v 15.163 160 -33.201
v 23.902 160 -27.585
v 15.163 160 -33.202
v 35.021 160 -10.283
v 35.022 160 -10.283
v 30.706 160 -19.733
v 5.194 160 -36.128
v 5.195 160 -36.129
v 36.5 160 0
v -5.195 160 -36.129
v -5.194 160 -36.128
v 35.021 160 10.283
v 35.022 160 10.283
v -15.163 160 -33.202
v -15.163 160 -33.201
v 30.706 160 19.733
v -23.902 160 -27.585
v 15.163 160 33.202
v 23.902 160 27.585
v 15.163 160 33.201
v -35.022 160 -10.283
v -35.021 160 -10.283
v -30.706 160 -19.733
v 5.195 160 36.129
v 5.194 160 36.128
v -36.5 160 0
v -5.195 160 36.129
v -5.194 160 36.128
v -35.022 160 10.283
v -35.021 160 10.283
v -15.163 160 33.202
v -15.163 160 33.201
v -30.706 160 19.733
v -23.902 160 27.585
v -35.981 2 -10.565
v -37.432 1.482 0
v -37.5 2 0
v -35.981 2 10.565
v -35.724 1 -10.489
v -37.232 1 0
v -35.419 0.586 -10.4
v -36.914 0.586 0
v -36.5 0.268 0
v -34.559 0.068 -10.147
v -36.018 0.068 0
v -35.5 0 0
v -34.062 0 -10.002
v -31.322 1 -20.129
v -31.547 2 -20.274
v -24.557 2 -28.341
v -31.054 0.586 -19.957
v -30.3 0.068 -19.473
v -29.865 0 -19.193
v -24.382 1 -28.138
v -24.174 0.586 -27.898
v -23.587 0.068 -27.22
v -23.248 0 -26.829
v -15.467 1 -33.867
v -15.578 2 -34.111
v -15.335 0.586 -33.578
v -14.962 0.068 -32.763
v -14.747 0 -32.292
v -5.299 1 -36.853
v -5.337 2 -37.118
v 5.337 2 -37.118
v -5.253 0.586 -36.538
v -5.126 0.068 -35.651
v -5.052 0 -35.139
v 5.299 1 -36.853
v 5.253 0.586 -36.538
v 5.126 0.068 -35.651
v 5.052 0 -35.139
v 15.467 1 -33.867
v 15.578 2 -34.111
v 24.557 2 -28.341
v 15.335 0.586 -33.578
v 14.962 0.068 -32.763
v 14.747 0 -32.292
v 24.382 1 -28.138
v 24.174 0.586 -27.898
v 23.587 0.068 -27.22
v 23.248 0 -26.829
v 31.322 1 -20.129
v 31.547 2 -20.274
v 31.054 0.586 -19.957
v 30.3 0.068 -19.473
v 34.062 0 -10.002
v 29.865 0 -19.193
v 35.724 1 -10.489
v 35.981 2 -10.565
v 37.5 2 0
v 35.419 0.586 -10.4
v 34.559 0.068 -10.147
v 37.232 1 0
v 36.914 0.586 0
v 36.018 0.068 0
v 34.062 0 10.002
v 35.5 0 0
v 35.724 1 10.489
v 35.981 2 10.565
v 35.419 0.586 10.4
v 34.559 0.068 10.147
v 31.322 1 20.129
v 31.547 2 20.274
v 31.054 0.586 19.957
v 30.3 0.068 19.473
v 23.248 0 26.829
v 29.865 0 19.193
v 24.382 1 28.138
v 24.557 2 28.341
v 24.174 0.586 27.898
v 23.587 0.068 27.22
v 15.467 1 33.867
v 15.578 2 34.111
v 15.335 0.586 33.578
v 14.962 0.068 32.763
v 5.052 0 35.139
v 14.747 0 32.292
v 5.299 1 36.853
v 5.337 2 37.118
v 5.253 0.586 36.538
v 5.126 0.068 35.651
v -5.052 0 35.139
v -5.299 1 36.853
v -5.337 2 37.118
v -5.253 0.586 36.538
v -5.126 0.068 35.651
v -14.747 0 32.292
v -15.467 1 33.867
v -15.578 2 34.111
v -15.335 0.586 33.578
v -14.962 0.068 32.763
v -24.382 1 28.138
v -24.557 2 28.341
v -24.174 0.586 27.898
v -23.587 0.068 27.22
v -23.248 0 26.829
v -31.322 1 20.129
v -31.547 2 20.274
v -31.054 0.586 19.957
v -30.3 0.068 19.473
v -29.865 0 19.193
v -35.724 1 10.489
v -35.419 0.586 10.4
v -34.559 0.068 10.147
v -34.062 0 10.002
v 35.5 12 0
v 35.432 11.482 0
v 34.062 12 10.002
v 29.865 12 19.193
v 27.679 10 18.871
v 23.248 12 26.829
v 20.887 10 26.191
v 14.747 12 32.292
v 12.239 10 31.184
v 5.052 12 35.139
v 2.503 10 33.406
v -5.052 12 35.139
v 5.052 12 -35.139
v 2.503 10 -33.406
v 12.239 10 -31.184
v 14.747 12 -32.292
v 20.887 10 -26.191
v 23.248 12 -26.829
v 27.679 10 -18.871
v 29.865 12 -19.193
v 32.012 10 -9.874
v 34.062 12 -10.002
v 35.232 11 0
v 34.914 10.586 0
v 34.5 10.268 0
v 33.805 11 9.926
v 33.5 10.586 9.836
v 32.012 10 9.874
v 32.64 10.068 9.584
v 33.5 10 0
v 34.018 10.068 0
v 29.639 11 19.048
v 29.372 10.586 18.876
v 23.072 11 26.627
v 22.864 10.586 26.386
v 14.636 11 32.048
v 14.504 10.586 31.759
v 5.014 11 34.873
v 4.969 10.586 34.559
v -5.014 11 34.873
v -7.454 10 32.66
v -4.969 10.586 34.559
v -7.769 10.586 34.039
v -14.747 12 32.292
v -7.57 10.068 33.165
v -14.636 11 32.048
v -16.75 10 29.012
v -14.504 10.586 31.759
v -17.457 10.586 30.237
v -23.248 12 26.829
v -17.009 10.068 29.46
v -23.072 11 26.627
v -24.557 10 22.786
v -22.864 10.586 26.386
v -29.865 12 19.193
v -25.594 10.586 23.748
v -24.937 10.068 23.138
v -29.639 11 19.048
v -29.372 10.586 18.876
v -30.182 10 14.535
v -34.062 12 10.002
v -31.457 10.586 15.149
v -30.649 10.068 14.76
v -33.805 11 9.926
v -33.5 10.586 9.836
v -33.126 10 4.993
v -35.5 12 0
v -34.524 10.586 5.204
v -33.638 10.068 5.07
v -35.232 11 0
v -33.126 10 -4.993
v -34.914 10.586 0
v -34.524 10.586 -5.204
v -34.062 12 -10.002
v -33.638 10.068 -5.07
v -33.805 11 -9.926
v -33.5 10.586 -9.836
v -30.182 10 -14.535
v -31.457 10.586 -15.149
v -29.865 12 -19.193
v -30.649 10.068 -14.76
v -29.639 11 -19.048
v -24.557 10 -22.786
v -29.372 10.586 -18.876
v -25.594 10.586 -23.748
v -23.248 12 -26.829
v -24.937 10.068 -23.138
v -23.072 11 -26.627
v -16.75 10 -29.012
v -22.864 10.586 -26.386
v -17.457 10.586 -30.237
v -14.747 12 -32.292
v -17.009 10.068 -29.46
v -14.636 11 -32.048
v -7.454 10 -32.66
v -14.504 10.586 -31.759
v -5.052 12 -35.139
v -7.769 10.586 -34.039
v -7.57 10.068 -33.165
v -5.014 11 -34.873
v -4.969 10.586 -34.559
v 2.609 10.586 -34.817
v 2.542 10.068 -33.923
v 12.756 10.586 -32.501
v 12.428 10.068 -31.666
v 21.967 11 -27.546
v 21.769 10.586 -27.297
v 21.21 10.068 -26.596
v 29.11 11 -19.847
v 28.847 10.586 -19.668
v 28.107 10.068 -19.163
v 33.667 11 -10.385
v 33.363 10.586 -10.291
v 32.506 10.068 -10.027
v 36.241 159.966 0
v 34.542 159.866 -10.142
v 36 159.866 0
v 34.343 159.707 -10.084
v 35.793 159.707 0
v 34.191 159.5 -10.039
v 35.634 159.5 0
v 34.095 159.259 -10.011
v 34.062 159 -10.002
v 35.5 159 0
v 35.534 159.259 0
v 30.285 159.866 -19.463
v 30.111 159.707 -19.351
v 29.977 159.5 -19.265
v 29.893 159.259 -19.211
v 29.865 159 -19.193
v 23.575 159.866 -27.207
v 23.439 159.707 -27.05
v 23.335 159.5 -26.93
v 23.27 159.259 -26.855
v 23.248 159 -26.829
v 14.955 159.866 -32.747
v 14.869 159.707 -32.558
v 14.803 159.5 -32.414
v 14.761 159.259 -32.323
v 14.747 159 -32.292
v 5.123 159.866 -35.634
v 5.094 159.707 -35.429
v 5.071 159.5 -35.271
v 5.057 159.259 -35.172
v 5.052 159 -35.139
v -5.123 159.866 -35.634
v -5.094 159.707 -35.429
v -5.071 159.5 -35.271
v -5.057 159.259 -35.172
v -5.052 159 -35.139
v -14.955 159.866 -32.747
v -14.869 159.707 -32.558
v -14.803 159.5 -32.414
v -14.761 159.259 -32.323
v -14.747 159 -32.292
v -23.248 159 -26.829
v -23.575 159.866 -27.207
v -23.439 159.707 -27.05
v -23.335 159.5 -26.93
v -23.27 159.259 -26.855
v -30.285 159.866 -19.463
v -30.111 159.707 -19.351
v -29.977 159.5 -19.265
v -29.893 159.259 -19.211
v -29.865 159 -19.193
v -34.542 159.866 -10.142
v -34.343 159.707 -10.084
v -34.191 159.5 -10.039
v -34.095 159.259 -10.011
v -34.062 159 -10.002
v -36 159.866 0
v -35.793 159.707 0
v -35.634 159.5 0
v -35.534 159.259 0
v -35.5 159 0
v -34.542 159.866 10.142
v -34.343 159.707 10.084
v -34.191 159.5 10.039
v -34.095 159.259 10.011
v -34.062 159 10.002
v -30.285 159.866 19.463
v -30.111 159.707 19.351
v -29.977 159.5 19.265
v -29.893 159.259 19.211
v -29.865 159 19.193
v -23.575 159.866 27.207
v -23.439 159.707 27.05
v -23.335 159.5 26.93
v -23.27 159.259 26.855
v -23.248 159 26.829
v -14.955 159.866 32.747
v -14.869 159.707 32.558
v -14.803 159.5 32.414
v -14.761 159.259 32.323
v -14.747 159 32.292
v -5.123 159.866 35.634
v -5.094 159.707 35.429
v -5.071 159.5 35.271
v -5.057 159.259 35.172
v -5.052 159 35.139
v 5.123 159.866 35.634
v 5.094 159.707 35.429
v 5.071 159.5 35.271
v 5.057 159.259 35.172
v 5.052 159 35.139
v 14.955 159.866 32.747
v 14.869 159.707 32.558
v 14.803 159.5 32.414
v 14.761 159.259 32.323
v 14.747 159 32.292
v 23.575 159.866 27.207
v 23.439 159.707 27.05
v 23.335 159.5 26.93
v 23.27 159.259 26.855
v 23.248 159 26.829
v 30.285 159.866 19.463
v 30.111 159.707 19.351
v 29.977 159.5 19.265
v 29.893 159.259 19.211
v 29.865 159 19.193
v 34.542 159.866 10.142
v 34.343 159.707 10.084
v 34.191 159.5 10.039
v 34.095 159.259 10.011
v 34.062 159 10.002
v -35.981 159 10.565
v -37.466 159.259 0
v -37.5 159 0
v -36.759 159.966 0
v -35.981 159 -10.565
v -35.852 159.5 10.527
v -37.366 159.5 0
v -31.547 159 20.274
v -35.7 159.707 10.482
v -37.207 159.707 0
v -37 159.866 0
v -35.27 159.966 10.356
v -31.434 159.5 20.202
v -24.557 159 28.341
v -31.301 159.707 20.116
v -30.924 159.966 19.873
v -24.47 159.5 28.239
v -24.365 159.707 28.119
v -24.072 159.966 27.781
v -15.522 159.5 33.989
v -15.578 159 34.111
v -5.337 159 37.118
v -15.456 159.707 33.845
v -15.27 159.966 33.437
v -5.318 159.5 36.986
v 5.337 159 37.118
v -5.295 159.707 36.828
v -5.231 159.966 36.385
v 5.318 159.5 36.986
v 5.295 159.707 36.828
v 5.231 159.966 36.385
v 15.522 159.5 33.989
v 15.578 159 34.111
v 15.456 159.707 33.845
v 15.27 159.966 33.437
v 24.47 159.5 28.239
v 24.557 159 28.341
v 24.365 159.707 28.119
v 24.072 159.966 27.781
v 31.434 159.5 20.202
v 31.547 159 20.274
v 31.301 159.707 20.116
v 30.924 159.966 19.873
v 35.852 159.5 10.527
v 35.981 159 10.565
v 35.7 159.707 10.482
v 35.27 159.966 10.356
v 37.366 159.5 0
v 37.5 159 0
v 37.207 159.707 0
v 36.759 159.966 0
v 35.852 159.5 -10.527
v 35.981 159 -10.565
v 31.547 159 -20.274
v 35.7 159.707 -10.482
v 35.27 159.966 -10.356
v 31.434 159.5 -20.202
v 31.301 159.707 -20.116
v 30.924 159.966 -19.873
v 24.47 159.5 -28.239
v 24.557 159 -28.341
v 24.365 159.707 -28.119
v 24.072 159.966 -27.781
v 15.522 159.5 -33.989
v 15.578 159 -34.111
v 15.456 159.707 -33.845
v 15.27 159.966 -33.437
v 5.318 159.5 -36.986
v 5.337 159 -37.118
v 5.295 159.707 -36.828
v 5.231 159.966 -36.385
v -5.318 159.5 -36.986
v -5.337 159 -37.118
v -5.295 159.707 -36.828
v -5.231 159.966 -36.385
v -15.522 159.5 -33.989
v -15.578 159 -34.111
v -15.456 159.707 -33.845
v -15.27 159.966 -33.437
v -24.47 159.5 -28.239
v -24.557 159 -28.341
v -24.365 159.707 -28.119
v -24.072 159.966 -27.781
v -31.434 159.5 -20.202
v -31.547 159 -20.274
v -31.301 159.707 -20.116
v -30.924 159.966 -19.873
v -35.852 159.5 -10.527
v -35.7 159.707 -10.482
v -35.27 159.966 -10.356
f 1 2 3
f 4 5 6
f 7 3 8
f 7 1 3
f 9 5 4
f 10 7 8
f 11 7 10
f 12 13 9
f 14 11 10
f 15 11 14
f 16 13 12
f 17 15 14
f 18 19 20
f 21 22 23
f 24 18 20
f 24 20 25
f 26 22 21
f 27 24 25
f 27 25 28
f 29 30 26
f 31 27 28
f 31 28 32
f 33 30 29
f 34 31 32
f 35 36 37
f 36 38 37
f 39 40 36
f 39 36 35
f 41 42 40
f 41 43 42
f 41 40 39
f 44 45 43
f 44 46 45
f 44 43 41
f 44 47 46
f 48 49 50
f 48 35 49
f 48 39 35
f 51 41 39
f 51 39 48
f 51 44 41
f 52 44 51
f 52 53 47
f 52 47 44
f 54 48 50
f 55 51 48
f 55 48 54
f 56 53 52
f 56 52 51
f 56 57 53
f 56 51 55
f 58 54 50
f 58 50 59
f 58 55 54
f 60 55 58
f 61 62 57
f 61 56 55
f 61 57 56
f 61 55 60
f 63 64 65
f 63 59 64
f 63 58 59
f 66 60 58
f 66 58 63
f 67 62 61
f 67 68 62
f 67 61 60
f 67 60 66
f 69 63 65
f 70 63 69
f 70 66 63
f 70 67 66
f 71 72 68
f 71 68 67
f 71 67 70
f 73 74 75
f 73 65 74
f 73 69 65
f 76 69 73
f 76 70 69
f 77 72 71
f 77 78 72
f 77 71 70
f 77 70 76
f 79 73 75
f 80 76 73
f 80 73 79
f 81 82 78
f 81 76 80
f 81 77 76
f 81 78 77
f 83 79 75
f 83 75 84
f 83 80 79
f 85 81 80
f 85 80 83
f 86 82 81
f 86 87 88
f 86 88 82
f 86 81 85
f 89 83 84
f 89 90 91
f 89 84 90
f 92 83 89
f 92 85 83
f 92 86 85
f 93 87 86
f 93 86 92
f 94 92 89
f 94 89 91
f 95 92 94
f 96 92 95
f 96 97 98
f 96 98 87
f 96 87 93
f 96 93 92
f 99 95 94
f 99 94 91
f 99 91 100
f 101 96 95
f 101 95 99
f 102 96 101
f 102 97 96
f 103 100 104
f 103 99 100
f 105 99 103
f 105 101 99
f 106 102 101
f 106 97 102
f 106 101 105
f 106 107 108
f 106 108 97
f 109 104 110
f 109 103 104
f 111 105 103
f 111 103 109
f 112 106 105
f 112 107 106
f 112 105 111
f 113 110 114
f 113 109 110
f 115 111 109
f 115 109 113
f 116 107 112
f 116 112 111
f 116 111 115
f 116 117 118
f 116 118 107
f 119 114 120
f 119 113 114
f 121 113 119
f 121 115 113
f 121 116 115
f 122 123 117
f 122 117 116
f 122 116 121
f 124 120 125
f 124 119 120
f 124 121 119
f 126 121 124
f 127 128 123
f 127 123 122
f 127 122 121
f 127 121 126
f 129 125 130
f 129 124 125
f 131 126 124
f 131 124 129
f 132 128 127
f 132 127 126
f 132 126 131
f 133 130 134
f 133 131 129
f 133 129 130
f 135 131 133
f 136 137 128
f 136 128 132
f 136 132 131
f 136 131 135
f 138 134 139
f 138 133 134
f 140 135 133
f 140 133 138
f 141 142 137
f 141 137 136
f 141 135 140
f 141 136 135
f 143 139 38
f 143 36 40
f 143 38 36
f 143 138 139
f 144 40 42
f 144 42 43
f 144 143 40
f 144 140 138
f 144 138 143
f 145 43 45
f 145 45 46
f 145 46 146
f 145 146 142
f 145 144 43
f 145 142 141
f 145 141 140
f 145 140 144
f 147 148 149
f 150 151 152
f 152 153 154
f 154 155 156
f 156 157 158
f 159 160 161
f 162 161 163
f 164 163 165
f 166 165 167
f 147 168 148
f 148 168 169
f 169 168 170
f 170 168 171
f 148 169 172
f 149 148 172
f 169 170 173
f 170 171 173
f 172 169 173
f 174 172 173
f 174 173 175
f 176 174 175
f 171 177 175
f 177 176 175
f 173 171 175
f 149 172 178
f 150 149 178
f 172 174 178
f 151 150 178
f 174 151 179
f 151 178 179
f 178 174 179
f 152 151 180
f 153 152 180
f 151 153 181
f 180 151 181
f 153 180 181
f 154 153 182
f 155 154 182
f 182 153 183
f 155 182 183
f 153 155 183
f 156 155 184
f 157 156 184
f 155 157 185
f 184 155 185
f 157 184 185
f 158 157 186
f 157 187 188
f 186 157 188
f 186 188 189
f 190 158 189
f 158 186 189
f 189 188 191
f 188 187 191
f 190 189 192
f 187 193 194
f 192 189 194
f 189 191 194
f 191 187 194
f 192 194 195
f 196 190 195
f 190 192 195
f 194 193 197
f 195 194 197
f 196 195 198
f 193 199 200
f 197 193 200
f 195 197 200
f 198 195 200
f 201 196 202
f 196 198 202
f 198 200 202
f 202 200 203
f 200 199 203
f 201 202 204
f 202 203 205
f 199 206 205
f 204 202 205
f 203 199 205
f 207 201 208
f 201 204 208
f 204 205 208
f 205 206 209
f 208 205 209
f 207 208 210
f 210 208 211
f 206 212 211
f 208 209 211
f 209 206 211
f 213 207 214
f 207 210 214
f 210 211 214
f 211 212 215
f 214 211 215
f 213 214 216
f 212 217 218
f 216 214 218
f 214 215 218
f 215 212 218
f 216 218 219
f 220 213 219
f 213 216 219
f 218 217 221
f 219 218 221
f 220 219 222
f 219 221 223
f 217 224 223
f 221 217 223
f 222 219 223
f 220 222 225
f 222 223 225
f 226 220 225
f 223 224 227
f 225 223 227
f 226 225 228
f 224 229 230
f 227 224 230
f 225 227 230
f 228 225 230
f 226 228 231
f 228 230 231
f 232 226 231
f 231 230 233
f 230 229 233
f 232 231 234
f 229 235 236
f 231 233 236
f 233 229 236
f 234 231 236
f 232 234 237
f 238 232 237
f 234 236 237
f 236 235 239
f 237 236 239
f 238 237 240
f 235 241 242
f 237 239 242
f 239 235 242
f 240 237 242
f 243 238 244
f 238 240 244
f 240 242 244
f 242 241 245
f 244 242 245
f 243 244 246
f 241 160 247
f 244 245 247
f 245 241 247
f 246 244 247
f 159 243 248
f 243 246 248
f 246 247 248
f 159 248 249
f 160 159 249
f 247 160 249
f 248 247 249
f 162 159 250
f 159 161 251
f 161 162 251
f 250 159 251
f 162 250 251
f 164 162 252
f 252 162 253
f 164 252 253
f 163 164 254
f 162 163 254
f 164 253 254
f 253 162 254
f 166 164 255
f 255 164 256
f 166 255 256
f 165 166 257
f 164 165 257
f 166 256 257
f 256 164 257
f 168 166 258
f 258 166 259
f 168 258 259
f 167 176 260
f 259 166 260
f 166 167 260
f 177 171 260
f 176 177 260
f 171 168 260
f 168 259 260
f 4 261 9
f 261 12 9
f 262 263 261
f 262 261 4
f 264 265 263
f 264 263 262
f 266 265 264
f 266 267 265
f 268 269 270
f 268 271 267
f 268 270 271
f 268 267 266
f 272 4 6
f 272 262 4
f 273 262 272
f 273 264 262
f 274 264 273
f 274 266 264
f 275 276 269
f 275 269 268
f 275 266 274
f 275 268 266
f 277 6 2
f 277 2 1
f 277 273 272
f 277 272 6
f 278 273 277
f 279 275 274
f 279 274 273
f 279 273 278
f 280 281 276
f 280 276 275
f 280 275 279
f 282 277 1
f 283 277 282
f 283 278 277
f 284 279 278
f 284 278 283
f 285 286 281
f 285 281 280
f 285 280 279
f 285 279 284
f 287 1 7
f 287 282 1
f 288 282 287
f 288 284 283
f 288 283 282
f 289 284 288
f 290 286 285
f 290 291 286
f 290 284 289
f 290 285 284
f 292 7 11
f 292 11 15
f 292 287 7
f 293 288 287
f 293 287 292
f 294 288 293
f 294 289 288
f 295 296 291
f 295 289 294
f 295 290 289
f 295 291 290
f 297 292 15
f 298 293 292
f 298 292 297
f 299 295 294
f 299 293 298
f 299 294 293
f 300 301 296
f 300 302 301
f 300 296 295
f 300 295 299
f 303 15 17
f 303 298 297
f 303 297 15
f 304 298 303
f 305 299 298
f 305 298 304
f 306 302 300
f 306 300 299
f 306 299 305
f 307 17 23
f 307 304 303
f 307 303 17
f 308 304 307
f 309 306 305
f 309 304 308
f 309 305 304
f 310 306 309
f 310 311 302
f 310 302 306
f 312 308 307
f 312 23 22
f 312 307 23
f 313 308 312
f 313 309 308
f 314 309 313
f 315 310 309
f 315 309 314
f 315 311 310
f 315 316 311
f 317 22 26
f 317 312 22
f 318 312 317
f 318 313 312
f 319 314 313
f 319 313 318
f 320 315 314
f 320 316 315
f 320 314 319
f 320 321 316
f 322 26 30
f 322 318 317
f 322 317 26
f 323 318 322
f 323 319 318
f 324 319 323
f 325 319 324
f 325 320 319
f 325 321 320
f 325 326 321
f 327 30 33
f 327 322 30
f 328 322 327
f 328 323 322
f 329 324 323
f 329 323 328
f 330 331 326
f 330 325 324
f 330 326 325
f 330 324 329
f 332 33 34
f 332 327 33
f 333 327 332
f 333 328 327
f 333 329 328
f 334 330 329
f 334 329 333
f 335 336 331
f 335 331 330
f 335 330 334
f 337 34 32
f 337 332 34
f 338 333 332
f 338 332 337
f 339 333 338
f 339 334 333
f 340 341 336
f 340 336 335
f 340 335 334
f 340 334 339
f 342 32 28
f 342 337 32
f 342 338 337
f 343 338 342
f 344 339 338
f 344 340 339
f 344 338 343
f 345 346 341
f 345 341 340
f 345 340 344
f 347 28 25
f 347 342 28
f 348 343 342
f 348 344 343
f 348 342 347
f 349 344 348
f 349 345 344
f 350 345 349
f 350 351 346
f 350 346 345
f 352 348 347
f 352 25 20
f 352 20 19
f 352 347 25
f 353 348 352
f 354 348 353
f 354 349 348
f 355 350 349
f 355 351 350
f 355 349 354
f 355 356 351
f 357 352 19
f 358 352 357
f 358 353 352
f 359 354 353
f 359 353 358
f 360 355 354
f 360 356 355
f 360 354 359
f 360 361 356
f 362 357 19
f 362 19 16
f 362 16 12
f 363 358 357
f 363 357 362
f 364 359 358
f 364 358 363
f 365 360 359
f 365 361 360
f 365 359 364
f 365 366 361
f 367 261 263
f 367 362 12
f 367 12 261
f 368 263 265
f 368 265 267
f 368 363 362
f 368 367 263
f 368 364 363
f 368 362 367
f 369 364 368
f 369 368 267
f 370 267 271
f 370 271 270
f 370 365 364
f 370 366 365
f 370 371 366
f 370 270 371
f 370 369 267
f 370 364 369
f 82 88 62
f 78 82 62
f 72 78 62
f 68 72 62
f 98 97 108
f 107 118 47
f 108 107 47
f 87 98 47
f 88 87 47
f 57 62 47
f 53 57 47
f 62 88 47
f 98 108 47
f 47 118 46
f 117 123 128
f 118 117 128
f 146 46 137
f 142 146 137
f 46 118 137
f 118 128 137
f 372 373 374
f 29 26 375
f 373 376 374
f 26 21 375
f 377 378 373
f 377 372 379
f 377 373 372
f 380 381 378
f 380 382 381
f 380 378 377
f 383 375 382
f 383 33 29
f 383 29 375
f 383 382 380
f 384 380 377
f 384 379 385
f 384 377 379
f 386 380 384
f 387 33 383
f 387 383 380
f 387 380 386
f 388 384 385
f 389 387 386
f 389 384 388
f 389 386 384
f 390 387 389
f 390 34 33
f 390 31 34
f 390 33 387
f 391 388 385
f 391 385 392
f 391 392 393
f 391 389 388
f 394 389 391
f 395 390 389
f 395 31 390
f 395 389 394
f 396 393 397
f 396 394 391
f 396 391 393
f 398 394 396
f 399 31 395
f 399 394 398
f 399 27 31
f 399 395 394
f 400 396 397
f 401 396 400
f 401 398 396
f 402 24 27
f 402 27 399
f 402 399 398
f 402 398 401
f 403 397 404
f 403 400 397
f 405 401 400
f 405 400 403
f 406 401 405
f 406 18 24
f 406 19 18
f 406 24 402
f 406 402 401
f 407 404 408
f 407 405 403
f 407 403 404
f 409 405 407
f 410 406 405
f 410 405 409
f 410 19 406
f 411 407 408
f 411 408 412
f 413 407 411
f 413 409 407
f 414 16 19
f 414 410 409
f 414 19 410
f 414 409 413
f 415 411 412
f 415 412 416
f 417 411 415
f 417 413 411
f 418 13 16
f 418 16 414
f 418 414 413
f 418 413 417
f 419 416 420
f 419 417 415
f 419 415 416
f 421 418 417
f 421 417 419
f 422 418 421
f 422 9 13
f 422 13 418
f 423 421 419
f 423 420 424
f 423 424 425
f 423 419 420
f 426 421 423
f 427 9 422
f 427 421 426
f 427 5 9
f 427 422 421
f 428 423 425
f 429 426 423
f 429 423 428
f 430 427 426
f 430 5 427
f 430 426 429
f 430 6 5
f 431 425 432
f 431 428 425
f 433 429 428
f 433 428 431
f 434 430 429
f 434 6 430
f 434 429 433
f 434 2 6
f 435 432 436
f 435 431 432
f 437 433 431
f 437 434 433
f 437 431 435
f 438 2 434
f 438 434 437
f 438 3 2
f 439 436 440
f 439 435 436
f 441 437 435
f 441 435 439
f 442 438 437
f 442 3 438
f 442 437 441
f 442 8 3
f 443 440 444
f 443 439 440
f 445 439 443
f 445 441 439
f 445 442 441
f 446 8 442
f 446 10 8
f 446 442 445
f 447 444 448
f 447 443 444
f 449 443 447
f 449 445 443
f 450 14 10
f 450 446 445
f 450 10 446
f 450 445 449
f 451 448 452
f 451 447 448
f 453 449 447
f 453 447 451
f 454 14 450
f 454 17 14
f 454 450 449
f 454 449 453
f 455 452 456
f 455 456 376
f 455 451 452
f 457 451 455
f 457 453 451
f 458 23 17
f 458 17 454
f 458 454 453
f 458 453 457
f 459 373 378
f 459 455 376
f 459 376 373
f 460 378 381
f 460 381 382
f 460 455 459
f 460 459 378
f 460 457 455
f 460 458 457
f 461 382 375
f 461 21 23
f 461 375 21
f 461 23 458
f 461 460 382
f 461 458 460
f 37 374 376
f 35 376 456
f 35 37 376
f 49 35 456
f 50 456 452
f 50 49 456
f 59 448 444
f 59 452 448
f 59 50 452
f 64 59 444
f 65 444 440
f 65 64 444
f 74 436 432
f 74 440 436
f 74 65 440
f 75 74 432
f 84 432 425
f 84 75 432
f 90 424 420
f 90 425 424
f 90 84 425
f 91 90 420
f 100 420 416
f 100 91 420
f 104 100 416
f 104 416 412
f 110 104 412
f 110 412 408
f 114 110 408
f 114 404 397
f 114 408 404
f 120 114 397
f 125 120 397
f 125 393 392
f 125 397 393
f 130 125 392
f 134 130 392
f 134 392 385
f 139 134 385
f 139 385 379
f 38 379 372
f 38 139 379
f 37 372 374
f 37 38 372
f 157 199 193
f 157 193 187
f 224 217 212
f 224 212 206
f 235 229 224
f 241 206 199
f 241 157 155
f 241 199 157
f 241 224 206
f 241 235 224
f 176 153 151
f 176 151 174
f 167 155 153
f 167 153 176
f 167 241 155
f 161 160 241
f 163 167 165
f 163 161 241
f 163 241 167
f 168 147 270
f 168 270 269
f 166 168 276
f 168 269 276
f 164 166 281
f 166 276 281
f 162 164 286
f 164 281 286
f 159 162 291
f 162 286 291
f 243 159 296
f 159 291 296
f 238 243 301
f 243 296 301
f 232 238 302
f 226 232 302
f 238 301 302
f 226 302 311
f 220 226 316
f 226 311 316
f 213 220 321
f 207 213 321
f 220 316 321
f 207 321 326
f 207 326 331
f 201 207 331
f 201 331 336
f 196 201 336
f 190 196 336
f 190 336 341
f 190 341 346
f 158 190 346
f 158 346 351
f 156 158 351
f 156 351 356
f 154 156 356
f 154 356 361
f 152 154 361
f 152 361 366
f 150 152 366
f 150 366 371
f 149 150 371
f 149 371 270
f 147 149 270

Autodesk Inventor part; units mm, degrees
ref_plane "YZ Plane" through (0, 0, 0) normal (1, 0, 0) x (0, 1, 0)
ref_plane "XZ Plane" through (0, 0, 0) normal (0, 1, 0) x (-1, 0, 0)
ref_plane "XY Plane" through (0, 0, 0) normal (0, 0, 1) x (1, 0, 0)
sketch "Skizze2" plane through (0, 0, 0) normal (0, 1, 0) x (-1, 0, 0)
  circle A0 centre (0, 0) radius 37.5
  dimension "d0" = 75
extrude "Extrusion1" add sketch "Skizze2" along normal blind 160
sketch "Skizze3" plane through (0, 160, 0) normal (0, 1, 0) x (1, 0, 0)
  circle A0 centre (0, 0) radius 35.5
  dimension "d3" = 71
extrude "Extrusion2" cut sketch "Skizze3" against normal blind 150
fillet "Rundung1" radius 1 2 edges at (37.5, 160, 0) (-35.5, 160, 0)
fillet "Rundung2" radius 2 1 edges at (37.5, 0, 0)
fillet "Rundung3" radius 2 1 edges at (-35.5, 10, 0)
properties part number "Glas" material "Glas"
